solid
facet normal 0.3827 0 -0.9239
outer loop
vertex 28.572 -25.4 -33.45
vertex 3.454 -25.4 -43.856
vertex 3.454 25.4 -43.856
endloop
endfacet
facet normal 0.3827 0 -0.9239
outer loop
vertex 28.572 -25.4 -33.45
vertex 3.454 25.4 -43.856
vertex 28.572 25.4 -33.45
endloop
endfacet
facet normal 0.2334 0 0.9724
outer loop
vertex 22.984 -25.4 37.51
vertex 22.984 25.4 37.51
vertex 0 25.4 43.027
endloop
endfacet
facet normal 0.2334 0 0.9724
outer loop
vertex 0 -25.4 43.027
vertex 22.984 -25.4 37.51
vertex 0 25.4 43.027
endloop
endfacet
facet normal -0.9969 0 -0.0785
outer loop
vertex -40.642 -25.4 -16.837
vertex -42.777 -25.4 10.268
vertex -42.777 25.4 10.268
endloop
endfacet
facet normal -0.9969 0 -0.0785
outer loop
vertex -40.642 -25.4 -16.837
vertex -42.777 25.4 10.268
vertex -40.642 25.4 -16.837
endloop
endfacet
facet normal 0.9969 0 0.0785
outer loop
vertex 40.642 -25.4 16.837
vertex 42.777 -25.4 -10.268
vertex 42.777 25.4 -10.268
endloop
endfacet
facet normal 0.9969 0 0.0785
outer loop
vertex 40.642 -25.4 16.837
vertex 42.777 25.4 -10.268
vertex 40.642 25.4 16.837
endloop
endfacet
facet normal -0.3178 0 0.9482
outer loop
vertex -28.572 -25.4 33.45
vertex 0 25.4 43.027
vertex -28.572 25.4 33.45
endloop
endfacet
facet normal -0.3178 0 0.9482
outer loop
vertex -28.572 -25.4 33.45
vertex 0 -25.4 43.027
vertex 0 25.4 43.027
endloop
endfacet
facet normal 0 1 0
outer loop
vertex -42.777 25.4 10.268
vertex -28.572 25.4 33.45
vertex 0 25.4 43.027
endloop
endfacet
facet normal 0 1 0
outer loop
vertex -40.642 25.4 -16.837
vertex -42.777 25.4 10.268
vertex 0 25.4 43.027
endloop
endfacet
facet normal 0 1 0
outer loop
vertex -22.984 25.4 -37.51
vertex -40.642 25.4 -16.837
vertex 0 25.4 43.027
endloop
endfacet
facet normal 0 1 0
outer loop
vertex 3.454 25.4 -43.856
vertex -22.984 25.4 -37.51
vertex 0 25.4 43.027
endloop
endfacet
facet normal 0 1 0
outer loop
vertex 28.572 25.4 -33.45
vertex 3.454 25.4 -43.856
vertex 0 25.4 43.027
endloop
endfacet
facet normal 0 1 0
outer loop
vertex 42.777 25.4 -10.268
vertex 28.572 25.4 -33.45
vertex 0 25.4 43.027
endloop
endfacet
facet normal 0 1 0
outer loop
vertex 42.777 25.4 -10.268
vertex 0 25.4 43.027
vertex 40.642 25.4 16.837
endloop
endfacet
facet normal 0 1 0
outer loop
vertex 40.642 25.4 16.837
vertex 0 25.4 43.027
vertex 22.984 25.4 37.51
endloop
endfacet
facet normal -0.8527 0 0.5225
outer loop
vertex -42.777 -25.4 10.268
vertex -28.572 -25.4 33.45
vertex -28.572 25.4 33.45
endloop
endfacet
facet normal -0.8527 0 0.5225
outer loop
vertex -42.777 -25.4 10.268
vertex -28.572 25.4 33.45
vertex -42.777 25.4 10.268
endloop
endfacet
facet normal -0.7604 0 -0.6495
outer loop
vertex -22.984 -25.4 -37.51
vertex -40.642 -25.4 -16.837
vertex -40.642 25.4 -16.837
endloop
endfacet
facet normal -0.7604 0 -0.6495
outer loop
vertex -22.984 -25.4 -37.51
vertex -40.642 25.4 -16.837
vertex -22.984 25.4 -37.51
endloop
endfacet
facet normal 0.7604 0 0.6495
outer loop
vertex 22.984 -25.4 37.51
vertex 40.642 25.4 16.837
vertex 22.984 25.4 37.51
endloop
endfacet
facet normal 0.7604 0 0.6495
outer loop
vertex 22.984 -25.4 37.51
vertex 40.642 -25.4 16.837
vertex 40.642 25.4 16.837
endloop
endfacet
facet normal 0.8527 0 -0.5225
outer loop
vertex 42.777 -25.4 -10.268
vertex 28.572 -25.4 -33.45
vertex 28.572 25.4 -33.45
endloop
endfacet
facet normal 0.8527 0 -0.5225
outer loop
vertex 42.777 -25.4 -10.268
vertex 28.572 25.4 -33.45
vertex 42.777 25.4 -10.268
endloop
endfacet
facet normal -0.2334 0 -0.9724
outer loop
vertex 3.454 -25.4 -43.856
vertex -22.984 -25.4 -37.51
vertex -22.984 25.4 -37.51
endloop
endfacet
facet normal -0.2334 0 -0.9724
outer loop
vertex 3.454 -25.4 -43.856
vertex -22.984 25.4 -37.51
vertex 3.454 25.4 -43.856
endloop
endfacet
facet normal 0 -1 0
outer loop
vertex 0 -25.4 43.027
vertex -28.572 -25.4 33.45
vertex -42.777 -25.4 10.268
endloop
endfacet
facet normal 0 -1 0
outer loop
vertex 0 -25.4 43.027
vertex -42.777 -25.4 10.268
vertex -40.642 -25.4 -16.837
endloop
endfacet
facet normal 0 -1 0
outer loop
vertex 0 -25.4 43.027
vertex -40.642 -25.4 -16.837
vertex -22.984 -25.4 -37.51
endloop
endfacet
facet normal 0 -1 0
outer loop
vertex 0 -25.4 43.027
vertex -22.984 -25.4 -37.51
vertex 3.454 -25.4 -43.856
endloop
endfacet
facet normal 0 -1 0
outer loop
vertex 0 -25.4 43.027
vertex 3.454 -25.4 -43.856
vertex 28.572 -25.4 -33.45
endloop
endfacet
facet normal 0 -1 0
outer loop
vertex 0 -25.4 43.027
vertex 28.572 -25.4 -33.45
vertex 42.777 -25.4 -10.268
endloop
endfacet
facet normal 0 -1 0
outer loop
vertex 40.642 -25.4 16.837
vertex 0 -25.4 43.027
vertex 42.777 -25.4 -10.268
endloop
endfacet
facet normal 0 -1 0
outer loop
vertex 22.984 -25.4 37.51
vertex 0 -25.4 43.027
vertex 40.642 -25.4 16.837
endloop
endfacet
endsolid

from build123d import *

# Parameters (mm, degrees)
F1_DEPTH = 25.4


with BuildPart() as f1:
    # F0 (on Front) → F1 (new body, symmetric)
    with BuildSketch(Plane.XZ):
        Polygon((-28.572113, 33.450269), (0, 0), (0, 43.027113), align=None)
        Polygon((22.983828, 37.510396), (0, 0), (40.642365, 16.836993), align=None)
        Polygon((42.7769, -10.267569), (0, 0), (28.572113, -33.450269), align=None)
        Polygon((0, 0), (-22.983828, -37.510396), (3.45375, -43.856103), align=None)
        Polygon((-42.7769, 10.267569), (-40.642365, -16.836993), (0, 0), align=None)
        Polygon((-42.7769, 10.267569), (0, 0), (-28.572113, 33.450269), align=None)
        Polygon((0, 43.027113), (0, 0), (22.983828, 37.510396), align=None)
        Polygon((40.642365, 16.836993), (0, 0), (42.7769, -10.267569), align=None)
        Polygon((0, 0), (3.45375, -43.856103), (28.572113, -33.450269), align=None)
        Polygon((-40.642365, -16.836993), (-22.983828, -37.510396), (0, 0), align=None)
    extrude(amount=F1_DEPTH, both=True)


solid = f1.part
